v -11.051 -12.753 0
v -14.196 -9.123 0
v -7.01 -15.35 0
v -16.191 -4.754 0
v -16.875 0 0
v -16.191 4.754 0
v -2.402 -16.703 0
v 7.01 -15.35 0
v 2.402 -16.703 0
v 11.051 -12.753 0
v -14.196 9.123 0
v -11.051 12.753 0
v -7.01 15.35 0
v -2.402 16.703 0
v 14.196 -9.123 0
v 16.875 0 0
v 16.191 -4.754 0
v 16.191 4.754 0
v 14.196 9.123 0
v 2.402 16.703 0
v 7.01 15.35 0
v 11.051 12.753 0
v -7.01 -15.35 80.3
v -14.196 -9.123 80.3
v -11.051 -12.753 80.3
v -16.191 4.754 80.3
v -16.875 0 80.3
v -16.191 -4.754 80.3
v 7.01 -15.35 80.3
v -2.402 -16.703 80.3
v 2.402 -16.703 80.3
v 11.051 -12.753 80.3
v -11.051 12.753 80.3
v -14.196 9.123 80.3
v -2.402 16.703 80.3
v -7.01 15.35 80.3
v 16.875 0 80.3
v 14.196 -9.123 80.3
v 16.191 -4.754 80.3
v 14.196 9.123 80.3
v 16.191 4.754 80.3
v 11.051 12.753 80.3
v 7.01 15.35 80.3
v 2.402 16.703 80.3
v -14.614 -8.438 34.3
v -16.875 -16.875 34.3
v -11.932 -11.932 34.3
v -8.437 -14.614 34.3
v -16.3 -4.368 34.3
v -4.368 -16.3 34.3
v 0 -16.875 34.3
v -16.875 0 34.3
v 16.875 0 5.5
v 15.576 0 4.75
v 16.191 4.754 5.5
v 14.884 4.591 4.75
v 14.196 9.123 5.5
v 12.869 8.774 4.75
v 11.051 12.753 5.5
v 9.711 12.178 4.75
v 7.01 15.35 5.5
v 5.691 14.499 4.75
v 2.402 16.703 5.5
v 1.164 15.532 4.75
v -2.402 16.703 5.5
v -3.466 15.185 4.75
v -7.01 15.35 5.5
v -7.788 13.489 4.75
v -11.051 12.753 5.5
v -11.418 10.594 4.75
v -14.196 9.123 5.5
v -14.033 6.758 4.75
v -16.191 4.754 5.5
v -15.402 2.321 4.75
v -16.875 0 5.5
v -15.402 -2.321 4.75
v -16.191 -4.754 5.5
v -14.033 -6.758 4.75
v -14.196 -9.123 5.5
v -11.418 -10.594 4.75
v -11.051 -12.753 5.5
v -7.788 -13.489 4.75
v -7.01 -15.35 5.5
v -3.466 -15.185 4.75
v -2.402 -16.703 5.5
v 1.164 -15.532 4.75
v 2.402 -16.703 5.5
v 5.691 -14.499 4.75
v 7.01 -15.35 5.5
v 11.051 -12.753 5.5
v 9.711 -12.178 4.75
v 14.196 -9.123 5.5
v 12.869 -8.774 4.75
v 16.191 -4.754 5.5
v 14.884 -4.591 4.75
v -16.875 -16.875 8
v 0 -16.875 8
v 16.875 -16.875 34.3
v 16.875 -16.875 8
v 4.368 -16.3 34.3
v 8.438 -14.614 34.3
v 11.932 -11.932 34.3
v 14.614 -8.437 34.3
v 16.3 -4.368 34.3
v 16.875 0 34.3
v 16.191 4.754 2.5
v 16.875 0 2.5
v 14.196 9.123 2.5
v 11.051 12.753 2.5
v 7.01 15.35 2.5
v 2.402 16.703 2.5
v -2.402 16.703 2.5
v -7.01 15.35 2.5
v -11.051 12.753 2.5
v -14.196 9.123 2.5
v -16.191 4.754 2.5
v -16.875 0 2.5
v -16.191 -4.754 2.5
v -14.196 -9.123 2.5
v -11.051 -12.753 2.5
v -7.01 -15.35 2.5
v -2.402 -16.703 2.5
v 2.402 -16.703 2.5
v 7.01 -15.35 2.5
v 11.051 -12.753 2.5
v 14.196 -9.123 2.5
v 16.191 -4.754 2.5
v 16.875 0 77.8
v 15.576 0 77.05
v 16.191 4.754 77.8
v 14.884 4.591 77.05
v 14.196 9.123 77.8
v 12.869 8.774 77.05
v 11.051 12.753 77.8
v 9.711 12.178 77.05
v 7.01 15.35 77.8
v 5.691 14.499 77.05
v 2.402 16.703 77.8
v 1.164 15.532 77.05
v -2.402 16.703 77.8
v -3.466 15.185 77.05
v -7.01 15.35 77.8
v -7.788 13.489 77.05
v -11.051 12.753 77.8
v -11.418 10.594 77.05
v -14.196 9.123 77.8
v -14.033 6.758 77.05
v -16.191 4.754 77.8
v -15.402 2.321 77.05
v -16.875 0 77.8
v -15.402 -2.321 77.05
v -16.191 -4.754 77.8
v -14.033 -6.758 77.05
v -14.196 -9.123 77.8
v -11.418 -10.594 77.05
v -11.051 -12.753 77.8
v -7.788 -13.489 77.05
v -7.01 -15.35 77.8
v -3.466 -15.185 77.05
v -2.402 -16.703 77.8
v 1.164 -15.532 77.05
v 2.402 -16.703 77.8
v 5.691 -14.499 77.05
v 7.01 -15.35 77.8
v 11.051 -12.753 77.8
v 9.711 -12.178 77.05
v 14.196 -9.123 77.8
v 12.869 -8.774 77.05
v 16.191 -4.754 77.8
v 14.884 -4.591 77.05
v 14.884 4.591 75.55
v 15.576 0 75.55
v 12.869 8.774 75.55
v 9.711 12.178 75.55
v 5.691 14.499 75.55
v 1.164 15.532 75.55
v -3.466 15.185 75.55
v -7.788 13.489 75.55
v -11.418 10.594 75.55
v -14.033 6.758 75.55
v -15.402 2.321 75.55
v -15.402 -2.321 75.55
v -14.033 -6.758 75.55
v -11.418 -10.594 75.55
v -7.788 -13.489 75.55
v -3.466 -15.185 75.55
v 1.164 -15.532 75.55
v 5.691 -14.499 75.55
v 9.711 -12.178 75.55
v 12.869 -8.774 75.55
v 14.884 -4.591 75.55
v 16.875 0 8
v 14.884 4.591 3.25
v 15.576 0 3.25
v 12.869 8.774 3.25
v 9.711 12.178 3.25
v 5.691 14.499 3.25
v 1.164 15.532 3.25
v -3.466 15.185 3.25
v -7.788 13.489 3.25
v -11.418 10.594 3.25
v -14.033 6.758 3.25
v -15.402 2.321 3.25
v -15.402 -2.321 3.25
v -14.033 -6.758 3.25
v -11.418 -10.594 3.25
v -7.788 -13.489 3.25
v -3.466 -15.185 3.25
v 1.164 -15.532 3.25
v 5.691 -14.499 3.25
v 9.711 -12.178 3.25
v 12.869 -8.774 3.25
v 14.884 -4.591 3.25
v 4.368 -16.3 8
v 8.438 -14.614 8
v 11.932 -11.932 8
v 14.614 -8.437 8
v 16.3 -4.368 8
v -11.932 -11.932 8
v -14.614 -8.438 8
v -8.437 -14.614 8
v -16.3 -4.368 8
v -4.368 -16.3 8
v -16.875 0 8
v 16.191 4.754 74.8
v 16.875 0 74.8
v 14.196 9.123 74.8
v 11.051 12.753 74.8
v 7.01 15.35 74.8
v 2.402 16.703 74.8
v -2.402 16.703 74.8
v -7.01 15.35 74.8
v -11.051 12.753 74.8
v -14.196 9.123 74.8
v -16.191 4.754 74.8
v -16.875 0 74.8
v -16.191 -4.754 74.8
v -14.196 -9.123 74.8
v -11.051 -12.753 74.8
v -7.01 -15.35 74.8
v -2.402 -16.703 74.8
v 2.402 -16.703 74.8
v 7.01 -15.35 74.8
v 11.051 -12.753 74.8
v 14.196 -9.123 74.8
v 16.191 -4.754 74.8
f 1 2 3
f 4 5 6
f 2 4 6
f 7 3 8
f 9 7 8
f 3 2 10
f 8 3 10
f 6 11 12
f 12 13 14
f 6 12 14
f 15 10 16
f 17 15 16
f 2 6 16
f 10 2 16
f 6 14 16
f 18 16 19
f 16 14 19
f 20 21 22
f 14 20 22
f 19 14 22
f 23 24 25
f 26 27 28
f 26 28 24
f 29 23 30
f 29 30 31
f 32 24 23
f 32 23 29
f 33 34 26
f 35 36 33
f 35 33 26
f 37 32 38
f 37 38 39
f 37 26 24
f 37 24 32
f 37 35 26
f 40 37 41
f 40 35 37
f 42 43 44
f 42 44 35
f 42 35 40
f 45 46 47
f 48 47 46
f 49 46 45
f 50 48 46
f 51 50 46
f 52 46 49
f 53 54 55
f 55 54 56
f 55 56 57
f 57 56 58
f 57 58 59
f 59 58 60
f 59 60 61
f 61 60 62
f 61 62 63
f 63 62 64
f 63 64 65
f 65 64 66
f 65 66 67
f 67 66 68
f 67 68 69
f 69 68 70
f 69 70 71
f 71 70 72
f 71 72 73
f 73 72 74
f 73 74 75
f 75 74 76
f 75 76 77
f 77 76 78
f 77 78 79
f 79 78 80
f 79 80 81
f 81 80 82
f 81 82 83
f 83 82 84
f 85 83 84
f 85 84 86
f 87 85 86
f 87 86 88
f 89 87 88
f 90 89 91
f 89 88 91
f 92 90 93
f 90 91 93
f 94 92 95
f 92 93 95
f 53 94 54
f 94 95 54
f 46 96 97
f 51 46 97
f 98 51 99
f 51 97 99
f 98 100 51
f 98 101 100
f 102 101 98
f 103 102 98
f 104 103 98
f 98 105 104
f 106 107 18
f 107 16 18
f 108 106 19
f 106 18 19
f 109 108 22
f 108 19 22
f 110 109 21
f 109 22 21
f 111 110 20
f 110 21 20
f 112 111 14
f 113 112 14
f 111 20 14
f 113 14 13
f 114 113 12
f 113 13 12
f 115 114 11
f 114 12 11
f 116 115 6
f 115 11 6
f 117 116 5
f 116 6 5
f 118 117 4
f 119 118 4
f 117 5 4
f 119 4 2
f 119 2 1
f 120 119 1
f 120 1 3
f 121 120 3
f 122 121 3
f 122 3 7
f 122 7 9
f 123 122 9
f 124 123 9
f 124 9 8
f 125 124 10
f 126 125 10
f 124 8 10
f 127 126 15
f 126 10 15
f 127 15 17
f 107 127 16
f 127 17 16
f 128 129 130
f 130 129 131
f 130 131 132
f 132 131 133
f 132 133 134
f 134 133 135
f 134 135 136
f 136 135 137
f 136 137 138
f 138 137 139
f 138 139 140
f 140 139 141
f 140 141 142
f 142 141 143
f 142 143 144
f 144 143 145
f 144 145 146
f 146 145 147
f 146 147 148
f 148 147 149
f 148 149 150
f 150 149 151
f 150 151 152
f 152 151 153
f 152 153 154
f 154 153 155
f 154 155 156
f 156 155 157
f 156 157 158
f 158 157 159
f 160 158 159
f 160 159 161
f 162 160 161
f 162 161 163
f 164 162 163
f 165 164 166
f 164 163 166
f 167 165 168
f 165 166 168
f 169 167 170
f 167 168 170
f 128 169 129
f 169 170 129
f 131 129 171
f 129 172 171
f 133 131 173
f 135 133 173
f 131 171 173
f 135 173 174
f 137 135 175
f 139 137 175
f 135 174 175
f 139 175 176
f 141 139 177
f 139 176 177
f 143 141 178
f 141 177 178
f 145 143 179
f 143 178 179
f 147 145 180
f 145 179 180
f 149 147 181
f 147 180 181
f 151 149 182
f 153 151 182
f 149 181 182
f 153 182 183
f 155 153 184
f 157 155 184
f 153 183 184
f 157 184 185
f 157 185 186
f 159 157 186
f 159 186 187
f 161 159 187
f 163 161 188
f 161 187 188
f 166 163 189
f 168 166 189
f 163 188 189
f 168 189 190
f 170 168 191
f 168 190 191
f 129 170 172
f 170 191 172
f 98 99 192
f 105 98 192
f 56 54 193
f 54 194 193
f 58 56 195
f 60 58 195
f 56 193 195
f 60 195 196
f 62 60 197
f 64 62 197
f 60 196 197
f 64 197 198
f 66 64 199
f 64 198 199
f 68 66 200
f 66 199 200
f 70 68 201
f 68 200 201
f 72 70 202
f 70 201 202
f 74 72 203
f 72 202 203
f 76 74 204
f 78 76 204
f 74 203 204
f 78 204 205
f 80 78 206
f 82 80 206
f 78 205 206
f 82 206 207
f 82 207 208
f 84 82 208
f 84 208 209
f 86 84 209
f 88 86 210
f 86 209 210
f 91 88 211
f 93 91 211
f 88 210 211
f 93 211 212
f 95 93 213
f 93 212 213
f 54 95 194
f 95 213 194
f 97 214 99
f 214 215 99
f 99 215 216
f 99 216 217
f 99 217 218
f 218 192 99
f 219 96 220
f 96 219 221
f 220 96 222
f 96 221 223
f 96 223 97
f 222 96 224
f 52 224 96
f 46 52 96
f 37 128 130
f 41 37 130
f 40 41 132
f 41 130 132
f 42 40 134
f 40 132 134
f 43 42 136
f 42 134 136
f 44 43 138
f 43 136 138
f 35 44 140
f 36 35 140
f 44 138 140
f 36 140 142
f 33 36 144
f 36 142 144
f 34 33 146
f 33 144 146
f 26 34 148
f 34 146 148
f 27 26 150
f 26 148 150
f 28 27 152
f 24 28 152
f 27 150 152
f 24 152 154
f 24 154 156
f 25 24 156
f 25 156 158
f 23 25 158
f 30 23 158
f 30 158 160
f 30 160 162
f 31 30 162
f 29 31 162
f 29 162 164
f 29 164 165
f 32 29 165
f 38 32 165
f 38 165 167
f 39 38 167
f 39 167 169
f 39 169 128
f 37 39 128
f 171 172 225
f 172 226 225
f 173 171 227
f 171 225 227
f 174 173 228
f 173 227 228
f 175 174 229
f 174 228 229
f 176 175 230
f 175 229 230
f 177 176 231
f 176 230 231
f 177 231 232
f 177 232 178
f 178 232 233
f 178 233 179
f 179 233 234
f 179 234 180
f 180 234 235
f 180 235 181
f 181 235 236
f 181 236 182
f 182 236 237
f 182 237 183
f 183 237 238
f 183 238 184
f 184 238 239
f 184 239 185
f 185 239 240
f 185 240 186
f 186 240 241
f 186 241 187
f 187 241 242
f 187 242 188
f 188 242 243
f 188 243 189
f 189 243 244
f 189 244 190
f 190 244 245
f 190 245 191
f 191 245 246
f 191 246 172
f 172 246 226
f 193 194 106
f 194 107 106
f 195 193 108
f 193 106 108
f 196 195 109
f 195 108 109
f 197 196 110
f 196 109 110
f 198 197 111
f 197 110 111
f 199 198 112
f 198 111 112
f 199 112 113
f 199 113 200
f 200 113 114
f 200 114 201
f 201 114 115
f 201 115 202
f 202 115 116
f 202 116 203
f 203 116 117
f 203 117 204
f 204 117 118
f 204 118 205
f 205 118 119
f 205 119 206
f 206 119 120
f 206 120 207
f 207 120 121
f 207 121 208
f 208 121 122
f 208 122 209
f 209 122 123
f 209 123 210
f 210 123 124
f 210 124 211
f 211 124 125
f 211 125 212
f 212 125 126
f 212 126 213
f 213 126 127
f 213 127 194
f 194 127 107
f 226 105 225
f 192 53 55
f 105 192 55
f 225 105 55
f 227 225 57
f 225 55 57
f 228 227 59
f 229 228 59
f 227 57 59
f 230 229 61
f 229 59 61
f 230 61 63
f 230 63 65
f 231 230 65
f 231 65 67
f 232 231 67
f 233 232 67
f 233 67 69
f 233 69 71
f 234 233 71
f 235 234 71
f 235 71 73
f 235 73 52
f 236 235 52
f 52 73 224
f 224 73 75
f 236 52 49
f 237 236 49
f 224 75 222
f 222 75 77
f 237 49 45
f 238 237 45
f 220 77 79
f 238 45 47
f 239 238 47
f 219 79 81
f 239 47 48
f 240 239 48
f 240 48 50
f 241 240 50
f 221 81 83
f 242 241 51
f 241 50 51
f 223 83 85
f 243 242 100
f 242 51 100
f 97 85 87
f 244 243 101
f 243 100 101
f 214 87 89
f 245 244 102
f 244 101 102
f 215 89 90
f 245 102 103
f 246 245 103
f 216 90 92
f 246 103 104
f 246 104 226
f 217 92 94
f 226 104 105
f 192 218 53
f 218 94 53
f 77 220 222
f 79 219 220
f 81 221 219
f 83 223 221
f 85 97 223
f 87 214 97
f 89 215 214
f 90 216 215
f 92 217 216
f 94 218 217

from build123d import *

# Parameters (mm, degrees)
SKETCH010_R  = 16.875
PAD002_DEPTH = 8
PAD003_DEPTH = 26.3
SKETCH012_R  = 16.875
PAD004_DEPTH = 46


with BuildPart() as part:
    # Sketch010 → Pad002 (new body)
    with BuildSketch(Plane.XY):
        Circle(SKETCH010_R)
    extrude(amount=PAD002_DEPTH)

    # Sketch011 (on Face3 of Pad002) → Pad003 (join)
    with BuildSketch(Plane.XY.offset(8)):
        with BuildLine():
            Line((-16.875, 0), (-16.875, -16.875))
            Line((-16.875, -16.875), (16.875, -16.875))
            Line((16.875, -16.875), (16.875, 0))
            ThreePointArc((16.875, 0), (0, 16.875), (-16.875, 0))
        make_face()
    extrude(amount=PAD003_DEPTH)

    # Sketch012 (on Face6 of Pad003) → Pad004 (join)
    with BuildSketch(Plane.XY.offset(34.3)):
        Circle(SKETCH012_R)
    extrude(amount=PAD004_DEPTH)

    # Sketch013 → Groove (revolve, cut)
    with BuildSketch(Plane.XZ):
        Polygon((18.174038, 75.55), (18.174038, 77.05), (16.875, 77.8), (15.575962, 77.05), (15.575962, 75.55), (16.875, 74.8), align=None)
        Polygon((18.174038, 3.25), (18.174038, 4.75), (16.875, 5.5), (15.575962, 4.75), (15.575962, 3.25), (16.875, 2.5), align=None)
    revolve(axis=Axis((0, 0, 0), (0, 0, 1)), mode=Mode.SUBTRACT)


solid = part.part
